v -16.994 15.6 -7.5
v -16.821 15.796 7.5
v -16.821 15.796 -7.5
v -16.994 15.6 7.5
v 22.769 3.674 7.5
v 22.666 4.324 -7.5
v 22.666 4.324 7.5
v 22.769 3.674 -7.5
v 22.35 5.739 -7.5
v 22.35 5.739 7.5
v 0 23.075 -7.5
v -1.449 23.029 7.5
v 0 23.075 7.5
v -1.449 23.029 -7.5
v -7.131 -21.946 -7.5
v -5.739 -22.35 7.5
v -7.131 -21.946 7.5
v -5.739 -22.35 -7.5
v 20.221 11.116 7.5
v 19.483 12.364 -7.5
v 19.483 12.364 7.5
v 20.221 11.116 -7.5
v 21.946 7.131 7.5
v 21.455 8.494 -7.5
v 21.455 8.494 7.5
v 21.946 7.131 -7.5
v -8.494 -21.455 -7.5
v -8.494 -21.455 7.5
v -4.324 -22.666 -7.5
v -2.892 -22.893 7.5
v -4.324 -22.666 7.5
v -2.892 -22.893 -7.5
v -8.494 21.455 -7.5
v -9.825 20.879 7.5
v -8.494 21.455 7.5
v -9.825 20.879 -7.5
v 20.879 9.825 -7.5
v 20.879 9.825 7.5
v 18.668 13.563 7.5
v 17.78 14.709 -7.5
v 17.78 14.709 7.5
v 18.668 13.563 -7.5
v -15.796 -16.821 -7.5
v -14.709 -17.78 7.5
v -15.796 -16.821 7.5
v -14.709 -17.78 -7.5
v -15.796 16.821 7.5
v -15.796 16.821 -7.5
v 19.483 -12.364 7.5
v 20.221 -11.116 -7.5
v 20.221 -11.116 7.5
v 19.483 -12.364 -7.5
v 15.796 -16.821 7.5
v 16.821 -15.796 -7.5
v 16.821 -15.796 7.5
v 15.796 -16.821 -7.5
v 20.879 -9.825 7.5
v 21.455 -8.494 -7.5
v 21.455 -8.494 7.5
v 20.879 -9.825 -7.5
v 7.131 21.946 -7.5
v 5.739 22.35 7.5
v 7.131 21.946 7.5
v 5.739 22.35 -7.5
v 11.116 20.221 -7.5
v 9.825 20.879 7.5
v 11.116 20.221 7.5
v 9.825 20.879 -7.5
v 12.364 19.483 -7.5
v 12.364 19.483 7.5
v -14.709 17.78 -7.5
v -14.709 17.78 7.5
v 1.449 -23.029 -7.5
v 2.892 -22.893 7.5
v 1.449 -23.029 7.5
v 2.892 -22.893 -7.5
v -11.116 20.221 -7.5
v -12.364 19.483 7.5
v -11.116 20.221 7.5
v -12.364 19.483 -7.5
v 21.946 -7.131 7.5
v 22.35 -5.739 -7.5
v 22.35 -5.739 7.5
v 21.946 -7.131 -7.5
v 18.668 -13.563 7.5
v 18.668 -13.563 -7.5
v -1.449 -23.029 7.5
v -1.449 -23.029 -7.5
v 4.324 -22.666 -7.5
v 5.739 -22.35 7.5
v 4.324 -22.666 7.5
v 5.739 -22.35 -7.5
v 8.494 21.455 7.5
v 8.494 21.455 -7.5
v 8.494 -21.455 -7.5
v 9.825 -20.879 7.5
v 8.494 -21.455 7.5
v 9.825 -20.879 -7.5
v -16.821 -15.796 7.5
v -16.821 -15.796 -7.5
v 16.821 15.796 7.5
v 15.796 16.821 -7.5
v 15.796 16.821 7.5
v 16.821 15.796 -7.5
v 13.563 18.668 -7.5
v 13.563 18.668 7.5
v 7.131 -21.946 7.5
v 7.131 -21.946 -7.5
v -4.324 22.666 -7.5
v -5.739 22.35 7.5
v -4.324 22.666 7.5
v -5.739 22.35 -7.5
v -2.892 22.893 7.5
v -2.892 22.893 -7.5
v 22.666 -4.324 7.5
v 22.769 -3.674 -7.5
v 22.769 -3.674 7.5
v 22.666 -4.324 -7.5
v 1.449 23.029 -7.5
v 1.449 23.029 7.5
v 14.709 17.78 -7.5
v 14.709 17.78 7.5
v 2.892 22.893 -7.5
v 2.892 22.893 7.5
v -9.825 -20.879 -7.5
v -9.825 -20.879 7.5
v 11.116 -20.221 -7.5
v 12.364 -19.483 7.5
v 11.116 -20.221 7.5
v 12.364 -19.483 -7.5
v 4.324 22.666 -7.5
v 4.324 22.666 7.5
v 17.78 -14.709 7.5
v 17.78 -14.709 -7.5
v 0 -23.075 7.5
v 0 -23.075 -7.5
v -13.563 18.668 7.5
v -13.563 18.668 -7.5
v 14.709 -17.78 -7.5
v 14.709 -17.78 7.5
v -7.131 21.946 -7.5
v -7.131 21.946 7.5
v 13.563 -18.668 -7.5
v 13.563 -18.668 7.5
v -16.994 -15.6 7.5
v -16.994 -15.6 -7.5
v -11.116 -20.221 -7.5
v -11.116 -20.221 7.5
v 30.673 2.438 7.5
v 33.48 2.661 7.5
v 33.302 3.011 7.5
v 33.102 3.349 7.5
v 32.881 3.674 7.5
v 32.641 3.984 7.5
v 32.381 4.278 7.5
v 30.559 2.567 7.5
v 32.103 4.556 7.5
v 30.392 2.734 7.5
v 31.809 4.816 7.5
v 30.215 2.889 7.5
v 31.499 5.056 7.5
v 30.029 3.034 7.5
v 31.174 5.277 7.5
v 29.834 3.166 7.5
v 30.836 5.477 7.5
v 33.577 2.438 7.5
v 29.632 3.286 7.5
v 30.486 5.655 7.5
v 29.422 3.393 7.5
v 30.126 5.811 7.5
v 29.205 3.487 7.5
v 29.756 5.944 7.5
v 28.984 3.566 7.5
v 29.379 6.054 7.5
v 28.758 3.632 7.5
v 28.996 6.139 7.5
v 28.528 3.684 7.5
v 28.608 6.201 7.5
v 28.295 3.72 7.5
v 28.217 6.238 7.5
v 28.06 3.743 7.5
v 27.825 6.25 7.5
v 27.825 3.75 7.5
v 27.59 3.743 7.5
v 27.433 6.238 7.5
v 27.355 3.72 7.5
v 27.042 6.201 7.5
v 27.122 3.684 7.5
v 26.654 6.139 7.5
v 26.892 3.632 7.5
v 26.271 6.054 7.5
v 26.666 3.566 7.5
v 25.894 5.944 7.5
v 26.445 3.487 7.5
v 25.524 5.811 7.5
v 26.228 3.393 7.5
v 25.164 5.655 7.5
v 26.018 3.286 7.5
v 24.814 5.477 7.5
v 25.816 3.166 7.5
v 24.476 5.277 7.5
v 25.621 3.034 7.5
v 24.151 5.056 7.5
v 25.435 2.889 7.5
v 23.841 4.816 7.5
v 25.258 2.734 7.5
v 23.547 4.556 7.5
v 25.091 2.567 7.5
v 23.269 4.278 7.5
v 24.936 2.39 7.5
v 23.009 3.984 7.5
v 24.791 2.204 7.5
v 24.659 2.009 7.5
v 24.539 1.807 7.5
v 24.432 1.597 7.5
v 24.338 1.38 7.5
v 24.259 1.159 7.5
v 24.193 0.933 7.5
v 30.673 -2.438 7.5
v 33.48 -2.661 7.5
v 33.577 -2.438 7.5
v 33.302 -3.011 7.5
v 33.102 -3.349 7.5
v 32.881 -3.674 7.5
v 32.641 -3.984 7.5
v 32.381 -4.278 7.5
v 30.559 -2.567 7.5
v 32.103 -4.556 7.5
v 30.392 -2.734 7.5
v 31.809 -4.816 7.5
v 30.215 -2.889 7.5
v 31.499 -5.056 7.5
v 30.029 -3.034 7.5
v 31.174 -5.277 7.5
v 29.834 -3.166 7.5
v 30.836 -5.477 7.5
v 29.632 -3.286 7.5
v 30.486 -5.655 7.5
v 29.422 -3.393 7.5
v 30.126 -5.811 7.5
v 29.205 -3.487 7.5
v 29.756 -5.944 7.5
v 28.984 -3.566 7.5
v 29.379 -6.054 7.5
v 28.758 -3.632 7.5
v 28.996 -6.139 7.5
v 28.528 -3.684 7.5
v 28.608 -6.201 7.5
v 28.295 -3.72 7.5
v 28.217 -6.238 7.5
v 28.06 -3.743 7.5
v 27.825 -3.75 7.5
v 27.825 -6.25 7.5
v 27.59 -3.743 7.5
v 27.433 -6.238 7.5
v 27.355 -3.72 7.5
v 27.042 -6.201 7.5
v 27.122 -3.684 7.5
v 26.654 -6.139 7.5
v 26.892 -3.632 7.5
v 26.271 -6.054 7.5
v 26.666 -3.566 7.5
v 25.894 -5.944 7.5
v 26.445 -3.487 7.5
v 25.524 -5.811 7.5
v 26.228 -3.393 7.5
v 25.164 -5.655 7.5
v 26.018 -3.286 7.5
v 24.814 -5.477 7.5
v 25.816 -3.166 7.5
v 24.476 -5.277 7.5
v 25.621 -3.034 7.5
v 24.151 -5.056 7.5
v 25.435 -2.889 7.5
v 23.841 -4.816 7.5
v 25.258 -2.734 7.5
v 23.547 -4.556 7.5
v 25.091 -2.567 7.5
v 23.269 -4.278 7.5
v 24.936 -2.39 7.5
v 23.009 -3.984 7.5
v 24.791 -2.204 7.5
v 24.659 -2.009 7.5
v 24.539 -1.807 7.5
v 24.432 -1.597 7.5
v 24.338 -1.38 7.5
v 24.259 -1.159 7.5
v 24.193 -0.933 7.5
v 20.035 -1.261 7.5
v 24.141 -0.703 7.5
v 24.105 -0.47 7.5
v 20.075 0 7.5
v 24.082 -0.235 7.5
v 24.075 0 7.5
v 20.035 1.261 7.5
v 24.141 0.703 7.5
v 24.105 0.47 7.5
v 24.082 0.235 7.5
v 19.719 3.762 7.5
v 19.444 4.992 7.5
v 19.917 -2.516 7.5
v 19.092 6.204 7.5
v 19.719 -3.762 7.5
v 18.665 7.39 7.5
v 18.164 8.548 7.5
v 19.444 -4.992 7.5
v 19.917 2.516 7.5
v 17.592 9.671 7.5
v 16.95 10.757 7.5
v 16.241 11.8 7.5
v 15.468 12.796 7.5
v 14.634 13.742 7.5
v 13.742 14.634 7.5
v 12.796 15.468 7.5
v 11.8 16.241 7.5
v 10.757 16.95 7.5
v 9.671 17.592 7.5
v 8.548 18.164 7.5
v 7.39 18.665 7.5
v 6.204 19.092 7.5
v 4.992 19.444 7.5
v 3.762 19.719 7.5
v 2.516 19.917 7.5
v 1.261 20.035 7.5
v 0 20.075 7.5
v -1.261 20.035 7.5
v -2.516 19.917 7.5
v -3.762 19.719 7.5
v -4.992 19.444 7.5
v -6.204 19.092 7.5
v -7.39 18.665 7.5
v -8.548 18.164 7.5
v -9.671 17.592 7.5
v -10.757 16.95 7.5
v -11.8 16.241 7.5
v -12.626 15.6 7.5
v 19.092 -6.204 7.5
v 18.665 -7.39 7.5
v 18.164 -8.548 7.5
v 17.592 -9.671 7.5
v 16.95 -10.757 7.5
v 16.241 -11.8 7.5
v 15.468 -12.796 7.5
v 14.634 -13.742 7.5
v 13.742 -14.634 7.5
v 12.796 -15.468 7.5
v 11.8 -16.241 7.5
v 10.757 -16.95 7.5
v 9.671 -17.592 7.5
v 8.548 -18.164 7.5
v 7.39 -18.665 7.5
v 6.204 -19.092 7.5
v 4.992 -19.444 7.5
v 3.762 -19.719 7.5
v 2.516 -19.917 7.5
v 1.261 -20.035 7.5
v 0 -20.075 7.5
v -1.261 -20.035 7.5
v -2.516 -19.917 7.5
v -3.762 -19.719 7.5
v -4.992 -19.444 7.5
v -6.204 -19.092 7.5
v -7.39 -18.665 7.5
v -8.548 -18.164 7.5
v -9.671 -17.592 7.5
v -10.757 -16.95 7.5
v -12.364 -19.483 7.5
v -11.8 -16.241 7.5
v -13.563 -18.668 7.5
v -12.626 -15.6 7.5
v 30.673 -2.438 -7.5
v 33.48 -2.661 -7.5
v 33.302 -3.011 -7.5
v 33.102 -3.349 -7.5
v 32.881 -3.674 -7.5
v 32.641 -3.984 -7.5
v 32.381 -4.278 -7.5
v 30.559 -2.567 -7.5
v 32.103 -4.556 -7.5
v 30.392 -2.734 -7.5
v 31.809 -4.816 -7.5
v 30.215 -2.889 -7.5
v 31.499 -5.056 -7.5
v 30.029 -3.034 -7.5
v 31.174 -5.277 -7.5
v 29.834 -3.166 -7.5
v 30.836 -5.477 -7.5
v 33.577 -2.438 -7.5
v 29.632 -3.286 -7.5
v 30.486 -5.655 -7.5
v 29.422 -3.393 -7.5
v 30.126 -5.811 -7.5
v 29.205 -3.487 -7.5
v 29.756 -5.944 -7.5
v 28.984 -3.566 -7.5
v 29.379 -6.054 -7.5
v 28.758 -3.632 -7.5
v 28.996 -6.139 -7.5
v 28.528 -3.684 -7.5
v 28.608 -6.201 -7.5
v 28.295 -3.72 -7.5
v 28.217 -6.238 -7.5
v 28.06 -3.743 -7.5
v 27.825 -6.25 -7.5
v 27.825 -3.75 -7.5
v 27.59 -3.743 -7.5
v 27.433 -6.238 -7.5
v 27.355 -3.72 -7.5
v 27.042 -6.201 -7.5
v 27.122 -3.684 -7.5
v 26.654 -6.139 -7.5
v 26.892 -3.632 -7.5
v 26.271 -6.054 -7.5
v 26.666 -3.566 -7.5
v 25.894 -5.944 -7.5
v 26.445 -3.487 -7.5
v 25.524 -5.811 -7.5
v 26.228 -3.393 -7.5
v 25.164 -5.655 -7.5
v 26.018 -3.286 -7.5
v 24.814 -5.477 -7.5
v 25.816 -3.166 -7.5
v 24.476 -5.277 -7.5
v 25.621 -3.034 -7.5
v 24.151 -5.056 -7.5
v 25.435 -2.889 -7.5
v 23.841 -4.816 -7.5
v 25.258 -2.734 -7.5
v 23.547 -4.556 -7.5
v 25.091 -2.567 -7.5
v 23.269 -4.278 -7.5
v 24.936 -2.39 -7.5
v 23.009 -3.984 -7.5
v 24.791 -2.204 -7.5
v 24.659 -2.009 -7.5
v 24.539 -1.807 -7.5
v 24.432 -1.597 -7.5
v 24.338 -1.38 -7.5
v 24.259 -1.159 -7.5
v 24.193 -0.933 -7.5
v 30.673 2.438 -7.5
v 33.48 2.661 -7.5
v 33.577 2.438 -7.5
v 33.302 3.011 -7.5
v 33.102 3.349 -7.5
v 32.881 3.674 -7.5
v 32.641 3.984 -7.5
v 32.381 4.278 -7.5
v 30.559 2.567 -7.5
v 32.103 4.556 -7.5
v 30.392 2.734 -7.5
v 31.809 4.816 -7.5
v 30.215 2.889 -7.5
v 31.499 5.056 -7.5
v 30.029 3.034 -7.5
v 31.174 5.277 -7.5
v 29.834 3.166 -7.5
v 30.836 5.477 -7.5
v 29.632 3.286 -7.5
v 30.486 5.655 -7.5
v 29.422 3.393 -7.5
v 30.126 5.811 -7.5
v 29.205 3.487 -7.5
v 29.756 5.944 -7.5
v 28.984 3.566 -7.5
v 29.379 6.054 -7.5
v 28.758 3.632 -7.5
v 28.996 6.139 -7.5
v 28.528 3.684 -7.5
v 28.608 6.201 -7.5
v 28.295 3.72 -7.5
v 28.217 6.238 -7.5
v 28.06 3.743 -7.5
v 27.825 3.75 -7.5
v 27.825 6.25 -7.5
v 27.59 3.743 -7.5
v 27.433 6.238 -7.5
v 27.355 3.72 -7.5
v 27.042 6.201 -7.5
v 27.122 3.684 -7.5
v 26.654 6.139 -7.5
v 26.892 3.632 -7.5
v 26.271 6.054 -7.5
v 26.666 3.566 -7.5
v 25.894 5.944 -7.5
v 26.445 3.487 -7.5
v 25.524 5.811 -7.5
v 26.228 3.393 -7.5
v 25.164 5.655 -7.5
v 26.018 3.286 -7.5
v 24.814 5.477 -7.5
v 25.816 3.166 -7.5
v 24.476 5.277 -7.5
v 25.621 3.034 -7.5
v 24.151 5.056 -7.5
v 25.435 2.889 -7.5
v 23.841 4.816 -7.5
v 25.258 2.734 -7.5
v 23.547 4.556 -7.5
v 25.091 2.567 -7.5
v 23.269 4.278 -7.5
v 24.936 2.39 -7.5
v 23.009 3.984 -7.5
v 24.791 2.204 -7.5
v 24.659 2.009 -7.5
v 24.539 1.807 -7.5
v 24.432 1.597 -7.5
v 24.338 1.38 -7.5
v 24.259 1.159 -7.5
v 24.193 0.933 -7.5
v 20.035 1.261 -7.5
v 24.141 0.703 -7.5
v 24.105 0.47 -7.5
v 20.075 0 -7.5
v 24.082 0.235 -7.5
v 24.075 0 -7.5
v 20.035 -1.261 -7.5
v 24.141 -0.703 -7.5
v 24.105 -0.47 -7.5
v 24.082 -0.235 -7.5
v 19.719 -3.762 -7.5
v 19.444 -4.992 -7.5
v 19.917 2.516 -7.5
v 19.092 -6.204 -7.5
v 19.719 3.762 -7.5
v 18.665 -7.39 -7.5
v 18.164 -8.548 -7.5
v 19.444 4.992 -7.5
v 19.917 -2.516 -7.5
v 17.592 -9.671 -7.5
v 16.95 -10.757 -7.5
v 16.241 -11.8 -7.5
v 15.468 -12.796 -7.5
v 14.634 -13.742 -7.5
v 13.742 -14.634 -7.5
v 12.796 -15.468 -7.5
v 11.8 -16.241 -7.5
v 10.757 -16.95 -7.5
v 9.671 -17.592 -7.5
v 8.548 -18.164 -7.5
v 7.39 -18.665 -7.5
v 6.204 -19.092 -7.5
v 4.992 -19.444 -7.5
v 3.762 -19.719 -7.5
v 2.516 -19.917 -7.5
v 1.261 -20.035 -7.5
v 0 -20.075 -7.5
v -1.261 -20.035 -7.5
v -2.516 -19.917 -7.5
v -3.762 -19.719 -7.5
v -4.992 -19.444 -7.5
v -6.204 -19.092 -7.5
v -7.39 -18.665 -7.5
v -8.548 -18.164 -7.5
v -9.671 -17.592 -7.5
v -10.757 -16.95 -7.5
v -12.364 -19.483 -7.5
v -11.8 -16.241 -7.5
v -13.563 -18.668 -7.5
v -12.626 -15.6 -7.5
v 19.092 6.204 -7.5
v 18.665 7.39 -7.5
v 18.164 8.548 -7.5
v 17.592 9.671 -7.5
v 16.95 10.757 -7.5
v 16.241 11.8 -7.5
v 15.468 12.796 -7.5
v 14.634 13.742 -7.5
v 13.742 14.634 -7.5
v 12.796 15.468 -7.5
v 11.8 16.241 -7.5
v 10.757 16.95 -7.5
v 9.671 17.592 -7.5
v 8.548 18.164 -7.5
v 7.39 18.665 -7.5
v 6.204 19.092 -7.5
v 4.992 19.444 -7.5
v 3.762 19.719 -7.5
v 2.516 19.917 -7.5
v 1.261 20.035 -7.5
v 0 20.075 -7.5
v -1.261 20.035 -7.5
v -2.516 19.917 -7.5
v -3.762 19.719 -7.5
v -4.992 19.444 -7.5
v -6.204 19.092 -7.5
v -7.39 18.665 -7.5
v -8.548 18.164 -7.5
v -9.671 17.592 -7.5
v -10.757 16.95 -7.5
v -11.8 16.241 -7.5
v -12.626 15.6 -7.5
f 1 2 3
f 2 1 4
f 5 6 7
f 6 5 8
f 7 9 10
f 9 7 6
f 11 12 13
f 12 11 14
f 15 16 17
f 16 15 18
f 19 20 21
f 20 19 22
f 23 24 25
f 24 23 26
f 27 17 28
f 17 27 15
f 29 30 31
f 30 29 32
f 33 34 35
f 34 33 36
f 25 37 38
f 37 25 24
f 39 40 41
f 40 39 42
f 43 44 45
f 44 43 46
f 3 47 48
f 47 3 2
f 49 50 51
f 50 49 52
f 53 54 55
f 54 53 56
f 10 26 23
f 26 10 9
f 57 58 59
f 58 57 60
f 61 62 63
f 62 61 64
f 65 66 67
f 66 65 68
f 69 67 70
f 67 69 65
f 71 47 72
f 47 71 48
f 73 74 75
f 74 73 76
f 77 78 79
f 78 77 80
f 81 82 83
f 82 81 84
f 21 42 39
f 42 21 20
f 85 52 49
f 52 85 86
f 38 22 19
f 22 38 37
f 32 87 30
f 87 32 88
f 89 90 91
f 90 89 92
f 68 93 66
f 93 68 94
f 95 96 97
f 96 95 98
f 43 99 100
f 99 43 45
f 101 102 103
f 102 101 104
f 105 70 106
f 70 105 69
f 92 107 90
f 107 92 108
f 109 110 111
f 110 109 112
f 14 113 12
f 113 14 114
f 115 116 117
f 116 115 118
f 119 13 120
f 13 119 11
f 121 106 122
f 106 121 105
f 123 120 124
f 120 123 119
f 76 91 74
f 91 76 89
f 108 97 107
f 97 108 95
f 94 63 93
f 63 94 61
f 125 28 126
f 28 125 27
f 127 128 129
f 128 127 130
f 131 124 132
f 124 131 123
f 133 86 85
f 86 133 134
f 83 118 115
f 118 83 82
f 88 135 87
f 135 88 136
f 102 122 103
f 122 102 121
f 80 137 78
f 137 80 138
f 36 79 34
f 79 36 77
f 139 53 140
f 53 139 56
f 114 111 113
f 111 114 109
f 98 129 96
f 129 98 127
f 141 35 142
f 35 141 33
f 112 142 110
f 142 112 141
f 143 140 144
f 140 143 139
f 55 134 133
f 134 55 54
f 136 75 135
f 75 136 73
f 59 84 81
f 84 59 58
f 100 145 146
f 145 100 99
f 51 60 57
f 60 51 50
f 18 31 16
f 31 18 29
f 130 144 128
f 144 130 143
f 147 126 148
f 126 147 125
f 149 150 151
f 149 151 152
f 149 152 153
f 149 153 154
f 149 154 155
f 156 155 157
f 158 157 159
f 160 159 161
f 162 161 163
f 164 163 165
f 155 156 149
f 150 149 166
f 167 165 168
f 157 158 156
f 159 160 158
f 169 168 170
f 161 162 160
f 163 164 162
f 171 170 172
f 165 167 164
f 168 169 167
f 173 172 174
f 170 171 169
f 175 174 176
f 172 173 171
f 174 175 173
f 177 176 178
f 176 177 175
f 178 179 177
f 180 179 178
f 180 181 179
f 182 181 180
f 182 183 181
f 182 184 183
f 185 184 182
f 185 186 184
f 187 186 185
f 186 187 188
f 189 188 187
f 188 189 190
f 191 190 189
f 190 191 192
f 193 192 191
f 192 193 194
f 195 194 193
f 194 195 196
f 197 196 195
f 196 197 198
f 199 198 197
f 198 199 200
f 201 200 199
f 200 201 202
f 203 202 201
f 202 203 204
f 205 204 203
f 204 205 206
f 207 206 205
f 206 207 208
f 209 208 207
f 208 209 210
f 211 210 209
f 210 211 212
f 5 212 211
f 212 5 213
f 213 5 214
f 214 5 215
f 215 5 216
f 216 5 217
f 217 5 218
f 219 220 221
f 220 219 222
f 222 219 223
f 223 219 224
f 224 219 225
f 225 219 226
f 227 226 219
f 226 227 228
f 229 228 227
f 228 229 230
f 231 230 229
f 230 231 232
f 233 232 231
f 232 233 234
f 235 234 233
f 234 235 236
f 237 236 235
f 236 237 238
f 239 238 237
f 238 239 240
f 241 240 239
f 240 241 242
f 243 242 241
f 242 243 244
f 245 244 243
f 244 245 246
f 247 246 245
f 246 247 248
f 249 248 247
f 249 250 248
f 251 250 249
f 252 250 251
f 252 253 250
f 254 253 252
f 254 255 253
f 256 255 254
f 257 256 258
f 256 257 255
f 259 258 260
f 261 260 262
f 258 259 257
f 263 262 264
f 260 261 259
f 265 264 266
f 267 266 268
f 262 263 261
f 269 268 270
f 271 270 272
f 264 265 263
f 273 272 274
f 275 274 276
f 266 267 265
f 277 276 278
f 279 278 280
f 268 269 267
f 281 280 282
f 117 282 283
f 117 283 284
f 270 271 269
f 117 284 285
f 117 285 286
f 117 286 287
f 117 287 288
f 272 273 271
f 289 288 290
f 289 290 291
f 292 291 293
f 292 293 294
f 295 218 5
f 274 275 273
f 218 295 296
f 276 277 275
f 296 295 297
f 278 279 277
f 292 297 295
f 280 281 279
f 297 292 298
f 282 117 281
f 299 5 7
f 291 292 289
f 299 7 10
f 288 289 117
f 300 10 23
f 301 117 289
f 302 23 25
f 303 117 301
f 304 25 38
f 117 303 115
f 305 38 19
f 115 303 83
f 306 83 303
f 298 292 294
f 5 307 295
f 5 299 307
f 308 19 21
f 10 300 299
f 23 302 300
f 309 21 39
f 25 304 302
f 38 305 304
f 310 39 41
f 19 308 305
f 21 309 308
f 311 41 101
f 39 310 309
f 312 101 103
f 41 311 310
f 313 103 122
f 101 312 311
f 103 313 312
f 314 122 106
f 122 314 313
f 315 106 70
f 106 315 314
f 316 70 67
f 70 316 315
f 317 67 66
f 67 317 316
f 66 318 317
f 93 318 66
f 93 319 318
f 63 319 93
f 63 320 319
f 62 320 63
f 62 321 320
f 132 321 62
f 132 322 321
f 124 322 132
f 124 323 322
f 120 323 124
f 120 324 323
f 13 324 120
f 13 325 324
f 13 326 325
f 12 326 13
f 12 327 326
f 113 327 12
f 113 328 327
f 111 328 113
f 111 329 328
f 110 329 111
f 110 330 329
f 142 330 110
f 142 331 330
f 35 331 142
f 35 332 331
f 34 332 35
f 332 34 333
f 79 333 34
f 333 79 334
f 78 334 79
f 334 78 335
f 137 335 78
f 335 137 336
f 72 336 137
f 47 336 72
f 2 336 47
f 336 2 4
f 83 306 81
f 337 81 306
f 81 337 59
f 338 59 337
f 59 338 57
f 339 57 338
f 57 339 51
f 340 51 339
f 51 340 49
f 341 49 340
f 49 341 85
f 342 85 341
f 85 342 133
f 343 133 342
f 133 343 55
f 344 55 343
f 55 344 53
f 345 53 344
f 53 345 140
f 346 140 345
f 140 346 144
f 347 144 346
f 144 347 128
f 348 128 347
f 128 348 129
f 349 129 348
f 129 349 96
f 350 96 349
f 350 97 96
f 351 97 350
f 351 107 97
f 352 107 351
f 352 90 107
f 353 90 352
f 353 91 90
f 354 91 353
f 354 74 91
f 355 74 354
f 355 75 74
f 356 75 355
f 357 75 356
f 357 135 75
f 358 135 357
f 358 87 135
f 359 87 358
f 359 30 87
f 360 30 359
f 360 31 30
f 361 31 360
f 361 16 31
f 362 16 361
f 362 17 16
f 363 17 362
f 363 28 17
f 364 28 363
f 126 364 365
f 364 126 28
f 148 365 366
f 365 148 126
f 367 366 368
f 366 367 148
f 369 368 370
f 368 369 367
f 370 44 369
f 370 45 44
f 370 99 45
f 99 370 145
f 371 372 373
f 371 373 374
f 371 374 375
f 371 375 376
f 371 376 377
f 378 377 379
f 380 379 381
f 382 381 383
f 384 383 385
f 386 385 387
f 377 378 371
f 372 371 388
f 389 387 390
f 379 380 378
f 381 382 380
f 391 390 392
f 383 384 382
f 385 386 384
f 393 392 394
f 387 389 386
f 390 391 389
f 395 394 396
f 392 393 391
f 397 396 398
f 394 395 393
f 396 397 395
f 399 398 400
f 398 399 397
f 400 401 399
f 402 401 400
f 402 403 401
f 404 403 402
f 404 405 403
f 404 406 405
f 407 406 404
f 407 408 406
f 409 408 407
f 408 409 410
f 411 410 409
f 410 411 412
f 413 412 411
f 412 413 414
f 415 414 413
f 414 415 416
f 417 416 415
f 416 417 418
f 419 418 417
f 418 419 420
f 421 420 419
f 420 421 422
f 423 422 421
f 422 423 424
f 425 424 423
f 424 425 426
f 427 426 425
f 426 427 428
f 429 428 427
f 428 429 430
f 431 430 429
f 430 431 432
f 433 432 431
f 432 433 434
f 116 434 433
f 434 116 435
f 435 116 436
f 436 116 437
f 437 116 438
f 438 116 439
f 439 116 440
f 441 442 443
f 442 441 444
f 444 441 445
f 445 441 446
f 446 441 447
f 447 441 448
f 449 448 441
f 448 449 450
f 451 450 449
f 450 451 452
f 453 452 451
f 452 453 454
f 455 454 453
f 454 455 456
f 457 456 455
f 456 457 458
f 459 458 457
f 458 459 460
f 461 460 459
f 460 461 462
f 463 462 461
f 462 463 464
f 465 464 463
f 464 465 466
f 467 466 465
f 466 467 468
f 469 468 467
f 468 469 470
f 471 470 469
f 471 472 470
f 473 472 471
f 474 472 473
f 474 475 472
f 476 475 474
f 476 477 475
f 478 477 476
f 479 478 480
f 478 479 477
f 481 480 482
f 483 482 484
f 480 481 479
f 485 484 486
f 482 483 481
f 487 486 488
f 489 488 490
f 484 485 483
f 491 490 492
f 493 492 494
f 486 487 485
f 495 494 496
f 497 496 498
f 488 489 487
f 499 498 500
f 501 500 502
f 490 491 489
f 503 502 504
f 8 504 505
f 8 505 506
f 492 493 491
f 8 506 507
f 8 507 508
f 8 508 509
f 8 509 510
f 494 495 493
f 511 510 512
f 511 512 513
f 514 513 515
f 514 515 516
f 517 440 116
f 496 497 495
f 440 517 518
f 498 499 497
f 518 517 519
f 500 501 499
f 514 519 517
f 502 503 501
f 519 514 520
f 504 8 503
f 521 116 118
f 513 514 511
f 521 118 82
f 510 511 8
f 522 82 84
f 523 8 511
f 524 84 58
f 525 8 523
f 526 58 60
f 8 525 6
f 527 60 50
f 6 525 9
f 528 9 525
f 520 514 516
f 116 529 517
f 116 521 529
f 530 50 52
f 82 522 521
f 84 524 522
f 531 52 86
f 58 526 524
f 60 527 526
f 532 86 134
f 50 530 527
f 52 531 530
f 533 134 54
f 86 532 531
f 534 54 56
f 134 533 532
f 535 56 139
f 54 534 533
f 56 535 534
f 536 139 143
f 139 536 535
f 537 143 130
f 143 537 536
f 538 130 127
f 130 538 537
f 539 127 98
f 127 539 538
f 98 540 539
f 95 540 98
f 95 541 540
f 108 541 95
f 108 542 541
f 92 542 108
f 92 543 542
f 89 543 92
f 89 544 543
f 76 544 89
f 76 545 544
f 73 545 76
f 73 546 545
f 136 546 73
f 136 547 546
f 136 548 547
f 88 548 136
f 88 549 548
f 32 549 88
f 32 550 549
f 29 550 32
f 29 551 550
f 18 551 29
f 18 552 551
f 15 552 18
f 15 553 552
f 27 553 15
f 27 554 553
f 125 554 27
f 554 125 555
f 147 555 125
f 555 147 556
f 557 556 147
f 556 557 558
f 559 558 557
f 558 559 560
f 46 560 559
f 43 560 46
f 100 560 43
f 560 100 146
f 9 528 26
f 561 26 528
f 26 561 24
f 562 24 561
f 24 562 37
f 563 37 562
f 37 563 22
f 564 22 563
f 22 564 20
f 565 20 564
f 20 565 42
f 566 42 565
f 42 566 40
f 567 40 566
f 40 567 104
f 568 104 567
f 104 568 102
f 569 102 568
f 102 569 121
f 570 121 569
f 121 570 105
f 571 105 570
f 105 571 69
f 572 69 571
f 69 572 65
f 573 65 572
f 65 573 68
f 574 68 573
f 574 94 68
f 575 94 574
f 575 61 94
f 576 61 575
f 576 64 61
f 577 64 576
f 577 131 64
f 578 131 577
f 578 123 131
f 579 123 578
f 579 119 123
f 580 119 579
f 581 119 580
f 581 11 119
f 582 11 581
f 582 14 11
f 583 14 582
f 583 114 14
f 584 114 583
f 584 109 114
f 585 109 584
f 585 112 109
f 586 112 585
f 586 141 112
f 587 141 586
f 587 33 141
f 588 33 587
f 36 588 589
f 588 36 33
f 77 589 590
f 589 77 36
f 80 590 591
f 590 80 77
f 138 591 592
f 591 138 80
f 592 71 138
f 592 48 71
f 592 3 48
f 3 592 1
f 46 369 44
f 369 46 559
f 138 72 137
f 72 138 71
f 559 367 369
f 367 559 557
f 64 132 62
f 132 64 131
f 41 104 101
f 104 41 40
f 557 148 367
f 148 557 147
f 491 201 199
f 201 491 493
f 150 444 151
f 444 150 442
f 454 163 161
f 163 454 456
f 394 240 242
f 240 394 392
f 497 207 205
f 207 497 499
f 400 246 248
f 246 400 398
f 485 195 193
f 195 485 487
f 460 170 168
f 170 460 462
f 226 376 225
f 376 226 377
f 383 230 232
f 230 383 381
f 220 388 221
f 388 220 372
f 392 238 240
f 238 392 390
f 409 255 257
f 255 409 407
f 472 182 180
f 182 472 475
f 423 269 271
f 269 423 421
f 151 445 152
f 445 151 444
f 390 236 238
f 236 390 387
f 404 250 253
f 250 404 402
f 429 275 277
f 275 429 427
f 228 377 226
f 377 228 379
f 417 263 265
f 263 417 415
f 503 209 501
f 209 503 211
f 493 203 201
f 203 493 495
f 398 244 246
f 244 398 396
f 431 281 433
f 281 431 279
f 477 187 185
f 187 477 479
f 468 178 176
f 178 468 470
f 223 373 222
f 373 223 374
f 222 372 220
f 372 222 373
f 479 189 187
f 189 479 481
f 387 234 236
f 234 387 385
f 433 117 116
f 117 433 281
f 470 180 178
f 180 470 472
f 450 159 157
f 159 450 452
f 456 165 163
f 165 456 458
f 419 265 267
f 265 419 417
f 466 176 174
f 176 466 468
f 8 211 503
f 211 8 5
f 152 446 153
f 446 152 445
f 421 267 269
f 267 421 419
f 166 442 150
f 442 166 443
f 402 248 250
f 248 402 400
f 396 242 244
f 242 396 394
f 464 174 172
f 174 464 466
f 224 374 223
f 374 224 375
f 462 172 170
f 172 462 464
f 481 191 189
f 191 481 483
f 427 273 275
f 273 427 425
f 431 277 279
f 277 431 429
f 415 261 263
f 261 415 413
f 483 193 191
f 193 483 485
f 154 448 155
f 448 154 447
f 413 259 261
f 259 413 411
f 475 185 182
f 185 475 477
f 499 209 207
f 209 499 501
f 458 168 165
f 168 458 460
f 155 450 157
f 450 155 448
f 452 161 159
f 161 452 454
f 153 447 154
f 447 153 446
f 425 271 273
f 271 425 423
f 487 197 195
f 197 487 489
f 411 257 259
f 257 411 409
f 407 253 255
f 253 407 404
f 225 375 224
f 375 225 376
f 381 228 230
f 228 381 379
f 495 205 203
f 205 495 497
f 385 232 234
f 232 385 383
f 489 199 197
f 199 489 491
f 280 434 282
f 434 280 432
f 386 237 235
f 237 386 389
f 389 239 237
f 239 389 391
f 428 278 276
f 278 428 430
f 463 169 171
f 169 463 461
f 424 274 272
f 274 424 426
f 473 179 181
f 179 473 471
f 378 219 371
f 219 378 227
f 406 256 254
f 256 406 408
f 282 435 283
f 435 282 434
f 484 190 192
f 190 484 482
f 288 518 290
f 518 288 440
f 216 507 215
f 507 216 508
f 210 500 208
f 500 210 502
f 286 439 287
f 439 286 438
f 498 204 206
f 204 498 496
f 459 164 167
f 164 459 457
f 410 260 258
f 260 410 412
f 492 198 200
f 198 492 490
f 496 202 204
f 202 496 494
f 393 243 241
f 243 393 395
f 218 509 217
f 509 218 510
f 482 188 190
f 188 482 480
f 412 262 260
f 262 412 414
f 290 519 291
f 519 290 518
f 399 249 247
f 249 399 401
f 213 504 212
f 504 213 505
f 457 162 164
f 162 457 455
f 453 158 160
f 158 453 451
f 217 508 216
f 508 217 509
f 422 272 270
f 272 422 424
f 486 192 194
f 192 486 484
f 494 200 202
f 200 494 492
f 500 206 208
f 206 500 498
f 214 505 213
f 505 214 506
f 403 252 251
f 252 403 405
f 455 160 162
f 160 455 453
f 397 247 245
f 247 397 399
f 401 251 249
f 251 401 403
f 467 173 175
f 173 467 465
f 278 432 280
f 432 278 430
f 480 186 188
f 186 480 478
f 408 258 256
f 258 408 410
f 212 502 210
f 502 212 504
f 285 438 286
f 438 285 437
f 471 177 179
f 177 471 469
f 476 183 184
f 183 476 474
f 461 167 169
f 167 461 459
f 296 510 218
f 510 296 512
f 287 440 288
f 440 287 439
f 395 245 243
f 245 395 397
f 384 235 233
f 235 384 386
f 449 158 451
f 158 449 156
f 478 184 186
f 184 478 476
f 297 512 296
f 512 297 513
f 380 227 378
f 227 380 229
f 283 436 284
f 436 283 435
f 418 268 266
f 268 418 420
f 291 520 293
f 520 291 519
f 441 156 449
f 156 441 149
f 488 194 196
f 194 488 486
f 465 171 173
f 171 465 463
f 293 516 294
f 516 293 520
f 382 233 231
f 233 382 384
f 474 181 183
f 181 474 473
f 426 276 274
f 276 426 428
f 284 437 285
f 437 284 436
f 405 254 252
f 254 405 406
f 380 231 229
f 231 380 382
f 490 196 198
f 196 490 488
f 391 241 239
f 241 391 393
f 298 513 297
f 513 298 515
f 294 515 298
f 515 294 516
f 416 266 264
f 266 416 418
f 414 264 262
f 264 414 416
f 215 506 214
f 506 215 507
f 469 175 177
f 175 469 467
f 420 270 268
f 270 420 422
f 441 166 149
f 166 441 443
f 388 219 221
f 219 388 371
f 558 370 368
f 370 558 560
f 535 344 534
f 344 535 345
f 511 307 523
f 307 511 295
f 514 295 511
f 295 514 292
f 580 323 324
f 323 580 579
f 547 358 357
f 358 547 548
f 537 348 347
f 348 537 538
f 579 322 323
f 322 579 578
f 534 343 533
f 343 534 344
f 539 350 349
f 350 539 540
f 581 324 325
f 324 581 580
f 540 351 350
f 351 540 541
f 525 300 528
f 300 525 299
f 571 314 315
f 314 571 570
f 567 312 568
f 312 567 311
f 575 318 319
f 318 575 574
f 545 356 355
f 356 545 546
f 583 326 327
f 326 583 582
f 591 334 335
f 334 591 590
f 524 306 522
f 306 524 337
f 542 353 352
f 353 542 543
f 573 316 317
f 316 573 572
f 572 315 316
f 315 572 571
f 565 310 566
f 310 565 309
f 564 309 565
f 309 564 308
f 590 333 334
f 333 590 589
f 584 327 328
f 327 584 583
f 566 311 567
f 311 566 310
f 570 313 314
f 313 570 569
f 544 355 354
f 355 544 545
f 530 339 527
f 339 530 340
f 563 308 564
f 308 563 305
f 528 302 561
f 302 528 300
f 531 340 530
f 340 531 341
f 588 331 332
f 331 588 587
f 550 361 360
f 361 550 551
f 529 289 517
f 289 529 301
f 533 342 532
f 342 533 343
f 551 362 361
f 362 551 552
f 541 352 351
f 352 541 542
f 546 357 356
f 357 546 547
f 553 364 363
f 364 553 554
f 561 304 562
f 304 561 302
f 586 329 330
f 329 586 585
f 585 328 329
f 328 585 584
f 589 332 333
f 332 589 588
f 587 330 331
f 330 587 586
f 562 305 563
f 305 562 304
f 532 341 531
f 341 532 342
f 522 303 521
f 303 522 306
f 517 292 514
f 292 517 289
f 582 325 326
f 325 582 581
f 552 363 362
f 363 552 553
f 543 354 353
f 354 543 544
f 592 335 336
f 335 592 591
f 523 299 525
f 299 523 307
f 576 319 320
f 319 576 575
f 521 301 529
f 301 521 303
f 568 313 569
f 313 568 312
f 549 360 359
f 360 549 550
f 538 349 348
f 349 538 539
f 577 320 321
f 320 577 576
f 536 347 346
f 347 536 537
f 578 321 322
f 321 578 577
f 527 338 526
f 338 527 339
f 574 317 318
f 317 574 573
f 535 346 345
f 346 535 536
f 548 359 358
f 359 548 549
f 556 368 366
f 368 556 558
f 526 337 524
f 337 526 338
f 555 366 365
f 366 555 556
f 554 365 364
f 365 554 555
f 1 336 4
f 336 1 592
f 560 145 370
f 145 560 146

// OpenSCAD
/*
 * ENTWURF: Aufklipsbarer Kabelclip
 * Funktion: Schnapp-Clip für Rohre mit seitlicher Kabelöse (z. B. für 6-8 mm Kabel).
 */

$fn = 100;

rohr_nennmass = 40.0;
toleranz = 0.15;
innen_durchmesser = rohr_nennmass + toleranz;
wanddicke = 3.0;
aussen_durchmesser = innen_durchmesser + (wanddicke * 2);
clip_hoehe = 15.0;
oeffnung_breite = rohr_nennmass * 0.78;

kabel_durchmesser = 7.5;
kabel_wand = 2.5;
kabel_aussen = kabel_durchmesser + (kabel_wand * 2);

kabelclip();

module kabelclip() {
    difference() {
        union() {
            // Rohr-Clip
            cylinder(d=aussen_durchmesser, h=clip_hoehe, center=true);
            // Kabel-Öse auf +X
            translate([(aussen_durchmesser/2) + (kabel_aussen/2) - 1.5, 0, 0])
                cylinder(d=kabel_aussen, h=clip_hoehe, center=true);
        }
        // Rohr-Innenbohrung & Öffnung
        cylinder(d=innen_durchmesser, h=clip_hoehe + 2, center=true);
        translate([-aussen_durchmesser/2, 0, 0])
            cube([aussen_durchmesser, oeffnung_breite, clip_hoehe + 2], center=true);

        // Kabel-Innenbohrung & schmaler Einführschlitz
        translate([(aussen_durchmesser/2) + (kabel_aussen/2) - 1.5, 0, 0]) {
            cylinder(d=kabel_durchmesser, h=clip_hoehe + 2, center=true);
            translate([kabel_aussen/2, 0, 0])
                cube([kabel_aussen, kabel_durchmesser * 0.65, clip_hoehe + 2], center=true);
        }
    }
}
